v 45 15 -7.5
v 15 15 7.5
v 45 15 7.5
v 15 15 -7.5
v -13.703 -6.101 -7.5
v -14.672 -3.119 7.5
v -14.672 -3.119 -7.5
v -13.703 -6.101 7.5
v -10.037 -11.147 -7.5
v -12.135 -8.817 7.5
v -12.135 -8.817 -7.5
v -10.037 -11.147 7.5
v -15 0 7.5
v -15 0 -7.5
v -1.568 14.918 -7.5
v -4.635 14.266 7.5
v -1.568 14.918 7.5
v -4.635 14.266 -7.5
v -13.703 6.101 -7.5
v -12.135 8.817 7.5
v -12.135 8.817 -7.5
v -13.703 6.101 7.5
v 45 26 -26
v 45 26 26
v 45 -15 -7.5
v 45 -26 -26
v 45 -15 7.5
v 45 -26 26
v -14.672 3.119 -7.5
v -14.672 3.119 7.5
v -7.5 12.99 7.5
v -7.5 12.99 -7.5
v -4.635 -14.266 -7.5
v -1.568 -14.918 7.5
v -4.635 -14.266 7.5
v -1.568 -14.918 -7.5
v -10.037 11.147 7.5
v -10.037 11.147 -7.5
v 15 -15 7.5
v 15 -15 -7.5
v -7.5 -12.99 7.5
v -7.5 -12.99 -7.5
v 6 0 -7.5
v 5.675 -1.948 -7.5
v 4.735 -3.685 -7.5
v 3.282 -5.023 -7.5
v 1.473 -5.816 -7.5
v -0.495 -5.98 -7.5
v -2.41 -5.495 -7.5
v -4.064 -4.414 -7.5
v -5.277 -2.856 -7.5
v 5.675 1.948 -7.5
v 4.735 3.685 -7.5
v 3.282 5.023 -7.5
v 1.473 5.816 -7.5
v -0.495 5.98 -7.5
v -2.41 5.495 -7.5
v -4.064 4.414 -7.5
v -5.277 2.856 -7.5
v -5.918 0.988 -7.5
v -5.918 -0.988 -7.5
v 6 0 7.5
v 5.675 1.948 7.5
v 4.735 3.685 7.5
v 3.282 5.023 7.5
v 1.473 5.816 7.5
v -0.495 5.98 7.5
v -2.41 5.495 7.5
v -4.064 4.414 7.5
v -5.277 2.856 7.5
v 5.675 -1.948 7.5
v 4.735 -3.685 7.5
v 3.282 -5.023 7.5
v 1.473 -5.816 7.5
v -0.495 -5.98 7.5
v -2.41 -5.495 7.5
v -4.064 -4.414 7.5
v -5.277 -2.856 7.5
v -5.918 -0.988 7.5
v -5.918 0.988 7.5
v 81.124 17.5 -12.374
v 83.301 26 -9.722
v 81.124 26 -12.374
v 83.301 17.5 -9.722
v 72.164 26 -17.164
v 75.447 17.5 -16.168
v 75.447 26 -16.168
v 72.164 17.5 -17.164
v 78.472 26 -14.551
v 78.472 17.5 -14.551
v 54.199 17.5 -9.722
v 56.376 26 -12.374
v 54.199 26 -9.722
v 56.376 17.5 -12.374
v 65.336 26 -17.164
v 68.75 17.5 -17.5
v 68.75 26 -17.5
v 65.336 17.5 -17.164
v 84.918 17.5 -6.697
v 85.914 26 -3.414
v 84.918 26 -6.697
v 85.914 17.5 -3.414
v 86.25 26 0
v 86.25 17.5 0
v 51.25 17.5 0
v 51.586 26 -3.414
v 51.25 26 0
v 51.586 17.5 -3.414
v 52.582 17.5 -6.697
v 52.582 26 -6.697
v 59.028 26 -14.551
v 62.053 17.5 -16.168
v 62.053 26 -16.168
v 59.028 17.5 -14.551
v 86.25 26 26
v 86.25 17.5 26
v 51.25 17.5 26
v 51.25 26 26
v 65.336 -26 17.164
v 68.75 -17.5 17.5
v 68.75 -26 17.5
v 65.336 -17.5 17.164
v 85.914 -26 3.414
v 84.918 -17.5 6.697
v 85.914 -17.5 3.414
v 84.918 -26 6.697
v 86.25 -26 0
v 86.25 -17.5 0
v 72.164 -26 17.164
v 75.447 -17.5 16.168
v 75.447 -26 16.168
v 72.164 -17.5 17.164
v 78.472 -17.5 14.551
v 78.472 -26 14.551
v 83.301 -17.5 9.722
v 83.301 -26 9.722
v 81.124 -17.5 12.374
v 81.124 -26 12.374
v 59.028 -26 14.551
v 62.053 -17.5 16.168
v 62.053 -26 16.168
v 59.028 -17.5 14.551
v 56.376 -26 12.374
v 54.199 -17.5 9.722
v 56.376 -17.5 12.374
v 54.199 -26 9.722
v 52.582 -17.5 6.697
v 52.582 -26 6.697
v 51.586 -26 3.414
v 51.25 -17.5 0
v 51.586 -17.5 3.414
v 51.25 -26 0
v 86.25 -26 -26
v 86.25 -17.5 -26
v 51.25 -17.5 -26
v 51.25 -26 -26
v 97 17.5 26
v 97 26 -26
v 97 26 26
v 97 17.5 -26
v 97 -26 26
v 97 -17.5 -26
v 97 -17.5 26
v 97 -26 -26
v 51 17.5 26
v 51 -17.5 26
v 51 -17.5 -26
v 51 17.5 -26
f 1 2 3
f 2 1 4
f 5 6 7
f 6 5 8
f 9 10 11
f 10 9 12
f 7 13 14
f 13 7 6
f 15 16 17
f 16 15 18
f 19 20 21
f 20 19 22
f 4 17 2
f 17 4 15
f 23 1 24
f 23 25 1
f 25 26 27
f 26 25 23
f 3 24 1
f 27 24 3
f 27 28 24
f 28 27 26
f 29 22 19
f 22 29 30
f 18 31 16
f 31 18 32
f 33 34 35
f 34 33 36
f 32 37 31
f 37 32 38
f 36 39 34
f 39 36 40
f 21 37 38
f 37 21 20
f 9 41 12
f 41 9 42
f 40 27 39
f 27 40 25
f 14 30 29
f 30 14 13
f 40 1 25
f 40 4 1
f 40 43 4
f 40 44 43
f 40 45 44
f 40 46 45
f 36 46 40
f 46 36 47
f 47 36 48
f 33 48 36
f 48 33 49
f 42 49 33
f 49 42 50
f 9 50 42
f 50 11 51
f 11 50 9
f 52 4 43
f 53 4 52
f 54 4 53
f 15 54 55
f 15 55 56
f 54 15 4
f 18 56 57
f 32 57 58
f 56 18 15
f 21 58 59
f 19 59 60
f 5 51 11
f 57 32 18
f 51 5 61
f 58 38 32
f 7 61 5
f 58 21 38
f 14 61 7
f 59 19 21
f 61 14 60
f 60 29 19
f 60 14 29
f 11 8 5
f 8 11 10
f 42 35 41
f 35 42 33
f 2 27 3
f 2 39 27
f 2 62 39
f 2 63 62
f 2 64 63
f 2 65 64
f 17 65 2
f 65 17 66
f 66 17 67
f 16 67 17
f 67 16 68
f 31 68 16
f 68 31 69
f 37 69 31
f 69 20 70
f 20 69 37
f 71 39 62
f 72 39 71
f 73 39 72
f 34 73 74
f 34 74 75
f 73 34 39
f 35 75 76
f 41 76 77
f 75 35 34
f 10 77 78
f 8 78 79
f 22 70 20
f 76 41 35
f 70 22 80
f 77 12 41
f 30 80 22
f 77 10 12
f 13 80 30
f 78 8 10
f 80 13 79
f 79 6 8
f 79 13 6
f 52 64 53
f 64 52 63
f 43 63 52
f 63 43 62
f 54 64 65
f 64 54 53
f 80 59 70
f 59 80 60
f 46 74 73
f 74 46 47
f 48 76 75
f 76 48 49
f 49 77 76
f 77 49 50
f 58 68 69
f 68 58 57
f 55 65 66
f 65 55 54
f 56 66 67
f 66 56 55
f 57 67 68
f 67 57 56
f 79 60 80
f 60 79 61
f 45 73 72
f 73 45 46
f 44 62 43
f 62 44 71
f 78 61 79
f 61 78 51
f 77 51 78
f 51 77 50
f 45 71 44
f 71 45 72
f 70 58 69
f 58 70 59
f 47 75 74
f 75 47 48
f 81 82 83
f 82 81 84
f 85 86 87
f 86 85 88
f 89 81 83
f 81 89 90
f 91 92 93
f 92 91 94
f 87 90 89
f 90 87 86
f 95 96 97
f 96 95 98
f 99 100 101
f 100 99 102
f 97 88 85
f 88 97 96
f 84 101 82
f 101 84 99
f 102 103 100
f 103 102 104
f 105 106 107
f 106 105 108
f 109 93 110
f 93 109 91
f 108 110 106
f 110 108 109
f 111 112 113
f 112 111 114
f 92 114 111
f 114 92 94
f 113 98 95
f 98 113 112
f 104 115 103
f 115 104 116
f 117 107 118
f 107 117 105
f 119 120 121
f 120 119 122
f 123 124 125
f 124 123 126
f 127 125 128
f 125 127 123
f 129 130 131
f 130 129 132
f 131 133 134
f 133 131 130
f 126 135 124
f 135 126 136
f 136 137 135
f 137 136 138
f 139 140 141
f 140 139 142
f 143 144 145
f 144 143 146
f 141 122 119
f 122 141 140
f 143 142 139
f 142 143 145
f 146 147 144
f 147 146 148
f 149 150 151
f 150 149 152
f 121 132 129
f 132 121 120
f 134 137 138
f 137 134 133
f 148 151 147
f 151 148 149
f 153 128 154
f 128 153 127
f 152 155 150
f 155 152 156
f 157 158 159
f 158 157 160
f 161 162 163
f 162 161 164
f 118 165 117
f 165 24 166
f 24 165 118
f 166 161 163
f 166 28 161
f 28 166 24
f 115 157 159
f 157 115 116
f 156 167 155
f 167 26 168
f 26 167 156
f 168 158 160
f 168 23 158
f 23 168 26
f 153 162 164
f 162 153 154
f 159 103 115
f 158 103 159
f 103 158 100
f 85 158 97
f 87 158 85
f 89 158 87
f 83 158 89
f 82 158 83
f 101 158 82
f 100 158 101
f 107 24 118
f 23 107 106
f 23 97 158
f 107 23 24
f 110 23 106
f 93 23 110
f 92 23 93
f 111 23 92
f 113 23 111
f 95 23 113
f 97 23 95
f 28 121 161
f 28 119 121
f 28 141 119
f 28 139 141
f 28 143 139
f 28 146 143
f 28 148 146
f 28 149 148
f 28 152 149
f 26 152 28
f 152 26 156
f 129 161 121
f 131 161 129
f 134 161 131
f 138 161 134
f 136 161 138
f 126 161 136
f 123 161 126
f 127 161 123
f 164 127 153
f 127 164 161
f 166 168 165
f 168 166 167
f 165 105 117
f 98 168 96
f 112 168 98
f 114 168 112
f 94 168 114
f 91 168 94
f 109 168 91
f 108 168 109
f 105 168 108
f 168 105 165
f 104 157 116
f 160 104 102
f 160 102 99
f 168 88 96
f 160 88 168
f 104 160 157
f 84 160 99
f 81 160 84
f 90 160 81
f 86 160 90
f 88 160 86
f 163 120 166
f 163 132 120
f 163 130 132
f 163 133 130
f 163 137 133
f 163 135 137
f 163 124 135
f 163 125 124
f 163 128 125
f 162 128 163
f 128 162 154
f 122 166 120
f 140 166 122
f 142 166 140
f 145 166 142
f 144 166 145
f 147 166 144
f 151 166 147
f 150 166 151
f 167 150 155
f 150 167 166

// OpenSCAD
// Trailer Coupling Mount with Locking Fork

// -- Parameters --
// Adjust these values to change the model's dimensions

// Overall dimensions
part_height = 15;              // Total height of the first section in mm
extension_length = 30;         // Length of the transition section
end_cube_size = 52;            // Edge length of the end cube

// Profile dimensions
cylinder_diameter = 30;        // Diameter of the circular end
bolt_hole_diameter = 12;       // Diameter of the hole for the bolt

// Fork dimensions
fork_cutout_width = 35;        // The width of the material to remove (Y-axis)
fork_cutout_depth = 60;        // The depth of the cut (X-axis)
lock_cutout_length = 35;       // The total length of the locking slots
lock_cutout_slot_width = 30;   // The width of the locking cutter
lock_cutout_slot_height = 35;  // The height of the locking cutter

// -- Modules --

// New module for the locking cutter cube
module locking_cutter(length, width, height) {
    // The cylinder's height axis is now oriented along the Y-axis.
    union() {
        // Cylinder for the round end
        translate([-height / 4, 0, height/2]) {
            rotate([90, 0, 0]) { // Rotate around X-axis to align cylinder's height with Y-axis
                cylinder(h = width, d = length, center = true, $fn = 32);
            }
        }
        // Cylinder for the round end
        translate([-height / 4, 0, -height/2]) {
            rotate([90, 0, 0]) { // Rotate around X-axis to align cylinder's height with Y-axis
                cylinder(h = width, d = length, center = true, $fn = 32);
            }
        }
        // Cube for the straight body
        translate([-height / 4, 0, 0]) {
            cube([length, width, height], center = true);
        }
    }
}

// Module for creating the entire fork end
module fork_end() {
    // Calculate start position of the locking cuts for clarity
    cut_start_x = extension_length + fork_cutout_depth/2 ; 
    
    difference() {
        // A) The solid 70x70x70 cube that we will cut into
        translate([extension_length + (cylinder_diameter / 2) + (end_cube_size / 2), 0, 0]) {
            cube(end_cube_size, center = true);
        }
        
        // B) The main cutter for the fork slot
        translate([extension_length + (cylinder_diameter / 2) + (end_cube_size / 2) + 10, 0, 0]) {
            cube([fork_cutout_depth, fork_cutout_width, end_cube_size + 2], center = true);
        }
        
        // C) The new locking cutout on the TOP of one tine (+Y side)
        translate([cut_start_x + (lock_cutout_length / 2), 30, 17.5]) {
            locking_cutter(lock_cutout_length, lock_cutout_slot_width, lock_cutout_slot_height);
        }

        // D) The mirrored locking cutout on the BOTTOM of the other tine (-Y side)
        translate([cut_start_x + (lock_cutout_length / 2), -30, -17.5]) {
            locking_cutter(lock_cutout_length, lock_cutout_slot_width, lock_cutout_slot_height);
        }
    }
}


// -- Model Generation --
// The main code that builds the part.

union() {
    
    // Part 1: Original hulled shape with the hole (unchanged)
    difference() {
        linear_extrude(height = part_height, center = true) {
            hull() {
                circle(d = cylinder_diameter);
                translate([extension_length, 0]) {
                    square(cylinder_diameter, center = true);
                }
            }
        }
        cylinder(h = part_height + 2, d = bolt_hole_diameter, center = true);
    }
    
    // Part 2: The fork-shaped end piece, created by the module
    fork_end();
}
